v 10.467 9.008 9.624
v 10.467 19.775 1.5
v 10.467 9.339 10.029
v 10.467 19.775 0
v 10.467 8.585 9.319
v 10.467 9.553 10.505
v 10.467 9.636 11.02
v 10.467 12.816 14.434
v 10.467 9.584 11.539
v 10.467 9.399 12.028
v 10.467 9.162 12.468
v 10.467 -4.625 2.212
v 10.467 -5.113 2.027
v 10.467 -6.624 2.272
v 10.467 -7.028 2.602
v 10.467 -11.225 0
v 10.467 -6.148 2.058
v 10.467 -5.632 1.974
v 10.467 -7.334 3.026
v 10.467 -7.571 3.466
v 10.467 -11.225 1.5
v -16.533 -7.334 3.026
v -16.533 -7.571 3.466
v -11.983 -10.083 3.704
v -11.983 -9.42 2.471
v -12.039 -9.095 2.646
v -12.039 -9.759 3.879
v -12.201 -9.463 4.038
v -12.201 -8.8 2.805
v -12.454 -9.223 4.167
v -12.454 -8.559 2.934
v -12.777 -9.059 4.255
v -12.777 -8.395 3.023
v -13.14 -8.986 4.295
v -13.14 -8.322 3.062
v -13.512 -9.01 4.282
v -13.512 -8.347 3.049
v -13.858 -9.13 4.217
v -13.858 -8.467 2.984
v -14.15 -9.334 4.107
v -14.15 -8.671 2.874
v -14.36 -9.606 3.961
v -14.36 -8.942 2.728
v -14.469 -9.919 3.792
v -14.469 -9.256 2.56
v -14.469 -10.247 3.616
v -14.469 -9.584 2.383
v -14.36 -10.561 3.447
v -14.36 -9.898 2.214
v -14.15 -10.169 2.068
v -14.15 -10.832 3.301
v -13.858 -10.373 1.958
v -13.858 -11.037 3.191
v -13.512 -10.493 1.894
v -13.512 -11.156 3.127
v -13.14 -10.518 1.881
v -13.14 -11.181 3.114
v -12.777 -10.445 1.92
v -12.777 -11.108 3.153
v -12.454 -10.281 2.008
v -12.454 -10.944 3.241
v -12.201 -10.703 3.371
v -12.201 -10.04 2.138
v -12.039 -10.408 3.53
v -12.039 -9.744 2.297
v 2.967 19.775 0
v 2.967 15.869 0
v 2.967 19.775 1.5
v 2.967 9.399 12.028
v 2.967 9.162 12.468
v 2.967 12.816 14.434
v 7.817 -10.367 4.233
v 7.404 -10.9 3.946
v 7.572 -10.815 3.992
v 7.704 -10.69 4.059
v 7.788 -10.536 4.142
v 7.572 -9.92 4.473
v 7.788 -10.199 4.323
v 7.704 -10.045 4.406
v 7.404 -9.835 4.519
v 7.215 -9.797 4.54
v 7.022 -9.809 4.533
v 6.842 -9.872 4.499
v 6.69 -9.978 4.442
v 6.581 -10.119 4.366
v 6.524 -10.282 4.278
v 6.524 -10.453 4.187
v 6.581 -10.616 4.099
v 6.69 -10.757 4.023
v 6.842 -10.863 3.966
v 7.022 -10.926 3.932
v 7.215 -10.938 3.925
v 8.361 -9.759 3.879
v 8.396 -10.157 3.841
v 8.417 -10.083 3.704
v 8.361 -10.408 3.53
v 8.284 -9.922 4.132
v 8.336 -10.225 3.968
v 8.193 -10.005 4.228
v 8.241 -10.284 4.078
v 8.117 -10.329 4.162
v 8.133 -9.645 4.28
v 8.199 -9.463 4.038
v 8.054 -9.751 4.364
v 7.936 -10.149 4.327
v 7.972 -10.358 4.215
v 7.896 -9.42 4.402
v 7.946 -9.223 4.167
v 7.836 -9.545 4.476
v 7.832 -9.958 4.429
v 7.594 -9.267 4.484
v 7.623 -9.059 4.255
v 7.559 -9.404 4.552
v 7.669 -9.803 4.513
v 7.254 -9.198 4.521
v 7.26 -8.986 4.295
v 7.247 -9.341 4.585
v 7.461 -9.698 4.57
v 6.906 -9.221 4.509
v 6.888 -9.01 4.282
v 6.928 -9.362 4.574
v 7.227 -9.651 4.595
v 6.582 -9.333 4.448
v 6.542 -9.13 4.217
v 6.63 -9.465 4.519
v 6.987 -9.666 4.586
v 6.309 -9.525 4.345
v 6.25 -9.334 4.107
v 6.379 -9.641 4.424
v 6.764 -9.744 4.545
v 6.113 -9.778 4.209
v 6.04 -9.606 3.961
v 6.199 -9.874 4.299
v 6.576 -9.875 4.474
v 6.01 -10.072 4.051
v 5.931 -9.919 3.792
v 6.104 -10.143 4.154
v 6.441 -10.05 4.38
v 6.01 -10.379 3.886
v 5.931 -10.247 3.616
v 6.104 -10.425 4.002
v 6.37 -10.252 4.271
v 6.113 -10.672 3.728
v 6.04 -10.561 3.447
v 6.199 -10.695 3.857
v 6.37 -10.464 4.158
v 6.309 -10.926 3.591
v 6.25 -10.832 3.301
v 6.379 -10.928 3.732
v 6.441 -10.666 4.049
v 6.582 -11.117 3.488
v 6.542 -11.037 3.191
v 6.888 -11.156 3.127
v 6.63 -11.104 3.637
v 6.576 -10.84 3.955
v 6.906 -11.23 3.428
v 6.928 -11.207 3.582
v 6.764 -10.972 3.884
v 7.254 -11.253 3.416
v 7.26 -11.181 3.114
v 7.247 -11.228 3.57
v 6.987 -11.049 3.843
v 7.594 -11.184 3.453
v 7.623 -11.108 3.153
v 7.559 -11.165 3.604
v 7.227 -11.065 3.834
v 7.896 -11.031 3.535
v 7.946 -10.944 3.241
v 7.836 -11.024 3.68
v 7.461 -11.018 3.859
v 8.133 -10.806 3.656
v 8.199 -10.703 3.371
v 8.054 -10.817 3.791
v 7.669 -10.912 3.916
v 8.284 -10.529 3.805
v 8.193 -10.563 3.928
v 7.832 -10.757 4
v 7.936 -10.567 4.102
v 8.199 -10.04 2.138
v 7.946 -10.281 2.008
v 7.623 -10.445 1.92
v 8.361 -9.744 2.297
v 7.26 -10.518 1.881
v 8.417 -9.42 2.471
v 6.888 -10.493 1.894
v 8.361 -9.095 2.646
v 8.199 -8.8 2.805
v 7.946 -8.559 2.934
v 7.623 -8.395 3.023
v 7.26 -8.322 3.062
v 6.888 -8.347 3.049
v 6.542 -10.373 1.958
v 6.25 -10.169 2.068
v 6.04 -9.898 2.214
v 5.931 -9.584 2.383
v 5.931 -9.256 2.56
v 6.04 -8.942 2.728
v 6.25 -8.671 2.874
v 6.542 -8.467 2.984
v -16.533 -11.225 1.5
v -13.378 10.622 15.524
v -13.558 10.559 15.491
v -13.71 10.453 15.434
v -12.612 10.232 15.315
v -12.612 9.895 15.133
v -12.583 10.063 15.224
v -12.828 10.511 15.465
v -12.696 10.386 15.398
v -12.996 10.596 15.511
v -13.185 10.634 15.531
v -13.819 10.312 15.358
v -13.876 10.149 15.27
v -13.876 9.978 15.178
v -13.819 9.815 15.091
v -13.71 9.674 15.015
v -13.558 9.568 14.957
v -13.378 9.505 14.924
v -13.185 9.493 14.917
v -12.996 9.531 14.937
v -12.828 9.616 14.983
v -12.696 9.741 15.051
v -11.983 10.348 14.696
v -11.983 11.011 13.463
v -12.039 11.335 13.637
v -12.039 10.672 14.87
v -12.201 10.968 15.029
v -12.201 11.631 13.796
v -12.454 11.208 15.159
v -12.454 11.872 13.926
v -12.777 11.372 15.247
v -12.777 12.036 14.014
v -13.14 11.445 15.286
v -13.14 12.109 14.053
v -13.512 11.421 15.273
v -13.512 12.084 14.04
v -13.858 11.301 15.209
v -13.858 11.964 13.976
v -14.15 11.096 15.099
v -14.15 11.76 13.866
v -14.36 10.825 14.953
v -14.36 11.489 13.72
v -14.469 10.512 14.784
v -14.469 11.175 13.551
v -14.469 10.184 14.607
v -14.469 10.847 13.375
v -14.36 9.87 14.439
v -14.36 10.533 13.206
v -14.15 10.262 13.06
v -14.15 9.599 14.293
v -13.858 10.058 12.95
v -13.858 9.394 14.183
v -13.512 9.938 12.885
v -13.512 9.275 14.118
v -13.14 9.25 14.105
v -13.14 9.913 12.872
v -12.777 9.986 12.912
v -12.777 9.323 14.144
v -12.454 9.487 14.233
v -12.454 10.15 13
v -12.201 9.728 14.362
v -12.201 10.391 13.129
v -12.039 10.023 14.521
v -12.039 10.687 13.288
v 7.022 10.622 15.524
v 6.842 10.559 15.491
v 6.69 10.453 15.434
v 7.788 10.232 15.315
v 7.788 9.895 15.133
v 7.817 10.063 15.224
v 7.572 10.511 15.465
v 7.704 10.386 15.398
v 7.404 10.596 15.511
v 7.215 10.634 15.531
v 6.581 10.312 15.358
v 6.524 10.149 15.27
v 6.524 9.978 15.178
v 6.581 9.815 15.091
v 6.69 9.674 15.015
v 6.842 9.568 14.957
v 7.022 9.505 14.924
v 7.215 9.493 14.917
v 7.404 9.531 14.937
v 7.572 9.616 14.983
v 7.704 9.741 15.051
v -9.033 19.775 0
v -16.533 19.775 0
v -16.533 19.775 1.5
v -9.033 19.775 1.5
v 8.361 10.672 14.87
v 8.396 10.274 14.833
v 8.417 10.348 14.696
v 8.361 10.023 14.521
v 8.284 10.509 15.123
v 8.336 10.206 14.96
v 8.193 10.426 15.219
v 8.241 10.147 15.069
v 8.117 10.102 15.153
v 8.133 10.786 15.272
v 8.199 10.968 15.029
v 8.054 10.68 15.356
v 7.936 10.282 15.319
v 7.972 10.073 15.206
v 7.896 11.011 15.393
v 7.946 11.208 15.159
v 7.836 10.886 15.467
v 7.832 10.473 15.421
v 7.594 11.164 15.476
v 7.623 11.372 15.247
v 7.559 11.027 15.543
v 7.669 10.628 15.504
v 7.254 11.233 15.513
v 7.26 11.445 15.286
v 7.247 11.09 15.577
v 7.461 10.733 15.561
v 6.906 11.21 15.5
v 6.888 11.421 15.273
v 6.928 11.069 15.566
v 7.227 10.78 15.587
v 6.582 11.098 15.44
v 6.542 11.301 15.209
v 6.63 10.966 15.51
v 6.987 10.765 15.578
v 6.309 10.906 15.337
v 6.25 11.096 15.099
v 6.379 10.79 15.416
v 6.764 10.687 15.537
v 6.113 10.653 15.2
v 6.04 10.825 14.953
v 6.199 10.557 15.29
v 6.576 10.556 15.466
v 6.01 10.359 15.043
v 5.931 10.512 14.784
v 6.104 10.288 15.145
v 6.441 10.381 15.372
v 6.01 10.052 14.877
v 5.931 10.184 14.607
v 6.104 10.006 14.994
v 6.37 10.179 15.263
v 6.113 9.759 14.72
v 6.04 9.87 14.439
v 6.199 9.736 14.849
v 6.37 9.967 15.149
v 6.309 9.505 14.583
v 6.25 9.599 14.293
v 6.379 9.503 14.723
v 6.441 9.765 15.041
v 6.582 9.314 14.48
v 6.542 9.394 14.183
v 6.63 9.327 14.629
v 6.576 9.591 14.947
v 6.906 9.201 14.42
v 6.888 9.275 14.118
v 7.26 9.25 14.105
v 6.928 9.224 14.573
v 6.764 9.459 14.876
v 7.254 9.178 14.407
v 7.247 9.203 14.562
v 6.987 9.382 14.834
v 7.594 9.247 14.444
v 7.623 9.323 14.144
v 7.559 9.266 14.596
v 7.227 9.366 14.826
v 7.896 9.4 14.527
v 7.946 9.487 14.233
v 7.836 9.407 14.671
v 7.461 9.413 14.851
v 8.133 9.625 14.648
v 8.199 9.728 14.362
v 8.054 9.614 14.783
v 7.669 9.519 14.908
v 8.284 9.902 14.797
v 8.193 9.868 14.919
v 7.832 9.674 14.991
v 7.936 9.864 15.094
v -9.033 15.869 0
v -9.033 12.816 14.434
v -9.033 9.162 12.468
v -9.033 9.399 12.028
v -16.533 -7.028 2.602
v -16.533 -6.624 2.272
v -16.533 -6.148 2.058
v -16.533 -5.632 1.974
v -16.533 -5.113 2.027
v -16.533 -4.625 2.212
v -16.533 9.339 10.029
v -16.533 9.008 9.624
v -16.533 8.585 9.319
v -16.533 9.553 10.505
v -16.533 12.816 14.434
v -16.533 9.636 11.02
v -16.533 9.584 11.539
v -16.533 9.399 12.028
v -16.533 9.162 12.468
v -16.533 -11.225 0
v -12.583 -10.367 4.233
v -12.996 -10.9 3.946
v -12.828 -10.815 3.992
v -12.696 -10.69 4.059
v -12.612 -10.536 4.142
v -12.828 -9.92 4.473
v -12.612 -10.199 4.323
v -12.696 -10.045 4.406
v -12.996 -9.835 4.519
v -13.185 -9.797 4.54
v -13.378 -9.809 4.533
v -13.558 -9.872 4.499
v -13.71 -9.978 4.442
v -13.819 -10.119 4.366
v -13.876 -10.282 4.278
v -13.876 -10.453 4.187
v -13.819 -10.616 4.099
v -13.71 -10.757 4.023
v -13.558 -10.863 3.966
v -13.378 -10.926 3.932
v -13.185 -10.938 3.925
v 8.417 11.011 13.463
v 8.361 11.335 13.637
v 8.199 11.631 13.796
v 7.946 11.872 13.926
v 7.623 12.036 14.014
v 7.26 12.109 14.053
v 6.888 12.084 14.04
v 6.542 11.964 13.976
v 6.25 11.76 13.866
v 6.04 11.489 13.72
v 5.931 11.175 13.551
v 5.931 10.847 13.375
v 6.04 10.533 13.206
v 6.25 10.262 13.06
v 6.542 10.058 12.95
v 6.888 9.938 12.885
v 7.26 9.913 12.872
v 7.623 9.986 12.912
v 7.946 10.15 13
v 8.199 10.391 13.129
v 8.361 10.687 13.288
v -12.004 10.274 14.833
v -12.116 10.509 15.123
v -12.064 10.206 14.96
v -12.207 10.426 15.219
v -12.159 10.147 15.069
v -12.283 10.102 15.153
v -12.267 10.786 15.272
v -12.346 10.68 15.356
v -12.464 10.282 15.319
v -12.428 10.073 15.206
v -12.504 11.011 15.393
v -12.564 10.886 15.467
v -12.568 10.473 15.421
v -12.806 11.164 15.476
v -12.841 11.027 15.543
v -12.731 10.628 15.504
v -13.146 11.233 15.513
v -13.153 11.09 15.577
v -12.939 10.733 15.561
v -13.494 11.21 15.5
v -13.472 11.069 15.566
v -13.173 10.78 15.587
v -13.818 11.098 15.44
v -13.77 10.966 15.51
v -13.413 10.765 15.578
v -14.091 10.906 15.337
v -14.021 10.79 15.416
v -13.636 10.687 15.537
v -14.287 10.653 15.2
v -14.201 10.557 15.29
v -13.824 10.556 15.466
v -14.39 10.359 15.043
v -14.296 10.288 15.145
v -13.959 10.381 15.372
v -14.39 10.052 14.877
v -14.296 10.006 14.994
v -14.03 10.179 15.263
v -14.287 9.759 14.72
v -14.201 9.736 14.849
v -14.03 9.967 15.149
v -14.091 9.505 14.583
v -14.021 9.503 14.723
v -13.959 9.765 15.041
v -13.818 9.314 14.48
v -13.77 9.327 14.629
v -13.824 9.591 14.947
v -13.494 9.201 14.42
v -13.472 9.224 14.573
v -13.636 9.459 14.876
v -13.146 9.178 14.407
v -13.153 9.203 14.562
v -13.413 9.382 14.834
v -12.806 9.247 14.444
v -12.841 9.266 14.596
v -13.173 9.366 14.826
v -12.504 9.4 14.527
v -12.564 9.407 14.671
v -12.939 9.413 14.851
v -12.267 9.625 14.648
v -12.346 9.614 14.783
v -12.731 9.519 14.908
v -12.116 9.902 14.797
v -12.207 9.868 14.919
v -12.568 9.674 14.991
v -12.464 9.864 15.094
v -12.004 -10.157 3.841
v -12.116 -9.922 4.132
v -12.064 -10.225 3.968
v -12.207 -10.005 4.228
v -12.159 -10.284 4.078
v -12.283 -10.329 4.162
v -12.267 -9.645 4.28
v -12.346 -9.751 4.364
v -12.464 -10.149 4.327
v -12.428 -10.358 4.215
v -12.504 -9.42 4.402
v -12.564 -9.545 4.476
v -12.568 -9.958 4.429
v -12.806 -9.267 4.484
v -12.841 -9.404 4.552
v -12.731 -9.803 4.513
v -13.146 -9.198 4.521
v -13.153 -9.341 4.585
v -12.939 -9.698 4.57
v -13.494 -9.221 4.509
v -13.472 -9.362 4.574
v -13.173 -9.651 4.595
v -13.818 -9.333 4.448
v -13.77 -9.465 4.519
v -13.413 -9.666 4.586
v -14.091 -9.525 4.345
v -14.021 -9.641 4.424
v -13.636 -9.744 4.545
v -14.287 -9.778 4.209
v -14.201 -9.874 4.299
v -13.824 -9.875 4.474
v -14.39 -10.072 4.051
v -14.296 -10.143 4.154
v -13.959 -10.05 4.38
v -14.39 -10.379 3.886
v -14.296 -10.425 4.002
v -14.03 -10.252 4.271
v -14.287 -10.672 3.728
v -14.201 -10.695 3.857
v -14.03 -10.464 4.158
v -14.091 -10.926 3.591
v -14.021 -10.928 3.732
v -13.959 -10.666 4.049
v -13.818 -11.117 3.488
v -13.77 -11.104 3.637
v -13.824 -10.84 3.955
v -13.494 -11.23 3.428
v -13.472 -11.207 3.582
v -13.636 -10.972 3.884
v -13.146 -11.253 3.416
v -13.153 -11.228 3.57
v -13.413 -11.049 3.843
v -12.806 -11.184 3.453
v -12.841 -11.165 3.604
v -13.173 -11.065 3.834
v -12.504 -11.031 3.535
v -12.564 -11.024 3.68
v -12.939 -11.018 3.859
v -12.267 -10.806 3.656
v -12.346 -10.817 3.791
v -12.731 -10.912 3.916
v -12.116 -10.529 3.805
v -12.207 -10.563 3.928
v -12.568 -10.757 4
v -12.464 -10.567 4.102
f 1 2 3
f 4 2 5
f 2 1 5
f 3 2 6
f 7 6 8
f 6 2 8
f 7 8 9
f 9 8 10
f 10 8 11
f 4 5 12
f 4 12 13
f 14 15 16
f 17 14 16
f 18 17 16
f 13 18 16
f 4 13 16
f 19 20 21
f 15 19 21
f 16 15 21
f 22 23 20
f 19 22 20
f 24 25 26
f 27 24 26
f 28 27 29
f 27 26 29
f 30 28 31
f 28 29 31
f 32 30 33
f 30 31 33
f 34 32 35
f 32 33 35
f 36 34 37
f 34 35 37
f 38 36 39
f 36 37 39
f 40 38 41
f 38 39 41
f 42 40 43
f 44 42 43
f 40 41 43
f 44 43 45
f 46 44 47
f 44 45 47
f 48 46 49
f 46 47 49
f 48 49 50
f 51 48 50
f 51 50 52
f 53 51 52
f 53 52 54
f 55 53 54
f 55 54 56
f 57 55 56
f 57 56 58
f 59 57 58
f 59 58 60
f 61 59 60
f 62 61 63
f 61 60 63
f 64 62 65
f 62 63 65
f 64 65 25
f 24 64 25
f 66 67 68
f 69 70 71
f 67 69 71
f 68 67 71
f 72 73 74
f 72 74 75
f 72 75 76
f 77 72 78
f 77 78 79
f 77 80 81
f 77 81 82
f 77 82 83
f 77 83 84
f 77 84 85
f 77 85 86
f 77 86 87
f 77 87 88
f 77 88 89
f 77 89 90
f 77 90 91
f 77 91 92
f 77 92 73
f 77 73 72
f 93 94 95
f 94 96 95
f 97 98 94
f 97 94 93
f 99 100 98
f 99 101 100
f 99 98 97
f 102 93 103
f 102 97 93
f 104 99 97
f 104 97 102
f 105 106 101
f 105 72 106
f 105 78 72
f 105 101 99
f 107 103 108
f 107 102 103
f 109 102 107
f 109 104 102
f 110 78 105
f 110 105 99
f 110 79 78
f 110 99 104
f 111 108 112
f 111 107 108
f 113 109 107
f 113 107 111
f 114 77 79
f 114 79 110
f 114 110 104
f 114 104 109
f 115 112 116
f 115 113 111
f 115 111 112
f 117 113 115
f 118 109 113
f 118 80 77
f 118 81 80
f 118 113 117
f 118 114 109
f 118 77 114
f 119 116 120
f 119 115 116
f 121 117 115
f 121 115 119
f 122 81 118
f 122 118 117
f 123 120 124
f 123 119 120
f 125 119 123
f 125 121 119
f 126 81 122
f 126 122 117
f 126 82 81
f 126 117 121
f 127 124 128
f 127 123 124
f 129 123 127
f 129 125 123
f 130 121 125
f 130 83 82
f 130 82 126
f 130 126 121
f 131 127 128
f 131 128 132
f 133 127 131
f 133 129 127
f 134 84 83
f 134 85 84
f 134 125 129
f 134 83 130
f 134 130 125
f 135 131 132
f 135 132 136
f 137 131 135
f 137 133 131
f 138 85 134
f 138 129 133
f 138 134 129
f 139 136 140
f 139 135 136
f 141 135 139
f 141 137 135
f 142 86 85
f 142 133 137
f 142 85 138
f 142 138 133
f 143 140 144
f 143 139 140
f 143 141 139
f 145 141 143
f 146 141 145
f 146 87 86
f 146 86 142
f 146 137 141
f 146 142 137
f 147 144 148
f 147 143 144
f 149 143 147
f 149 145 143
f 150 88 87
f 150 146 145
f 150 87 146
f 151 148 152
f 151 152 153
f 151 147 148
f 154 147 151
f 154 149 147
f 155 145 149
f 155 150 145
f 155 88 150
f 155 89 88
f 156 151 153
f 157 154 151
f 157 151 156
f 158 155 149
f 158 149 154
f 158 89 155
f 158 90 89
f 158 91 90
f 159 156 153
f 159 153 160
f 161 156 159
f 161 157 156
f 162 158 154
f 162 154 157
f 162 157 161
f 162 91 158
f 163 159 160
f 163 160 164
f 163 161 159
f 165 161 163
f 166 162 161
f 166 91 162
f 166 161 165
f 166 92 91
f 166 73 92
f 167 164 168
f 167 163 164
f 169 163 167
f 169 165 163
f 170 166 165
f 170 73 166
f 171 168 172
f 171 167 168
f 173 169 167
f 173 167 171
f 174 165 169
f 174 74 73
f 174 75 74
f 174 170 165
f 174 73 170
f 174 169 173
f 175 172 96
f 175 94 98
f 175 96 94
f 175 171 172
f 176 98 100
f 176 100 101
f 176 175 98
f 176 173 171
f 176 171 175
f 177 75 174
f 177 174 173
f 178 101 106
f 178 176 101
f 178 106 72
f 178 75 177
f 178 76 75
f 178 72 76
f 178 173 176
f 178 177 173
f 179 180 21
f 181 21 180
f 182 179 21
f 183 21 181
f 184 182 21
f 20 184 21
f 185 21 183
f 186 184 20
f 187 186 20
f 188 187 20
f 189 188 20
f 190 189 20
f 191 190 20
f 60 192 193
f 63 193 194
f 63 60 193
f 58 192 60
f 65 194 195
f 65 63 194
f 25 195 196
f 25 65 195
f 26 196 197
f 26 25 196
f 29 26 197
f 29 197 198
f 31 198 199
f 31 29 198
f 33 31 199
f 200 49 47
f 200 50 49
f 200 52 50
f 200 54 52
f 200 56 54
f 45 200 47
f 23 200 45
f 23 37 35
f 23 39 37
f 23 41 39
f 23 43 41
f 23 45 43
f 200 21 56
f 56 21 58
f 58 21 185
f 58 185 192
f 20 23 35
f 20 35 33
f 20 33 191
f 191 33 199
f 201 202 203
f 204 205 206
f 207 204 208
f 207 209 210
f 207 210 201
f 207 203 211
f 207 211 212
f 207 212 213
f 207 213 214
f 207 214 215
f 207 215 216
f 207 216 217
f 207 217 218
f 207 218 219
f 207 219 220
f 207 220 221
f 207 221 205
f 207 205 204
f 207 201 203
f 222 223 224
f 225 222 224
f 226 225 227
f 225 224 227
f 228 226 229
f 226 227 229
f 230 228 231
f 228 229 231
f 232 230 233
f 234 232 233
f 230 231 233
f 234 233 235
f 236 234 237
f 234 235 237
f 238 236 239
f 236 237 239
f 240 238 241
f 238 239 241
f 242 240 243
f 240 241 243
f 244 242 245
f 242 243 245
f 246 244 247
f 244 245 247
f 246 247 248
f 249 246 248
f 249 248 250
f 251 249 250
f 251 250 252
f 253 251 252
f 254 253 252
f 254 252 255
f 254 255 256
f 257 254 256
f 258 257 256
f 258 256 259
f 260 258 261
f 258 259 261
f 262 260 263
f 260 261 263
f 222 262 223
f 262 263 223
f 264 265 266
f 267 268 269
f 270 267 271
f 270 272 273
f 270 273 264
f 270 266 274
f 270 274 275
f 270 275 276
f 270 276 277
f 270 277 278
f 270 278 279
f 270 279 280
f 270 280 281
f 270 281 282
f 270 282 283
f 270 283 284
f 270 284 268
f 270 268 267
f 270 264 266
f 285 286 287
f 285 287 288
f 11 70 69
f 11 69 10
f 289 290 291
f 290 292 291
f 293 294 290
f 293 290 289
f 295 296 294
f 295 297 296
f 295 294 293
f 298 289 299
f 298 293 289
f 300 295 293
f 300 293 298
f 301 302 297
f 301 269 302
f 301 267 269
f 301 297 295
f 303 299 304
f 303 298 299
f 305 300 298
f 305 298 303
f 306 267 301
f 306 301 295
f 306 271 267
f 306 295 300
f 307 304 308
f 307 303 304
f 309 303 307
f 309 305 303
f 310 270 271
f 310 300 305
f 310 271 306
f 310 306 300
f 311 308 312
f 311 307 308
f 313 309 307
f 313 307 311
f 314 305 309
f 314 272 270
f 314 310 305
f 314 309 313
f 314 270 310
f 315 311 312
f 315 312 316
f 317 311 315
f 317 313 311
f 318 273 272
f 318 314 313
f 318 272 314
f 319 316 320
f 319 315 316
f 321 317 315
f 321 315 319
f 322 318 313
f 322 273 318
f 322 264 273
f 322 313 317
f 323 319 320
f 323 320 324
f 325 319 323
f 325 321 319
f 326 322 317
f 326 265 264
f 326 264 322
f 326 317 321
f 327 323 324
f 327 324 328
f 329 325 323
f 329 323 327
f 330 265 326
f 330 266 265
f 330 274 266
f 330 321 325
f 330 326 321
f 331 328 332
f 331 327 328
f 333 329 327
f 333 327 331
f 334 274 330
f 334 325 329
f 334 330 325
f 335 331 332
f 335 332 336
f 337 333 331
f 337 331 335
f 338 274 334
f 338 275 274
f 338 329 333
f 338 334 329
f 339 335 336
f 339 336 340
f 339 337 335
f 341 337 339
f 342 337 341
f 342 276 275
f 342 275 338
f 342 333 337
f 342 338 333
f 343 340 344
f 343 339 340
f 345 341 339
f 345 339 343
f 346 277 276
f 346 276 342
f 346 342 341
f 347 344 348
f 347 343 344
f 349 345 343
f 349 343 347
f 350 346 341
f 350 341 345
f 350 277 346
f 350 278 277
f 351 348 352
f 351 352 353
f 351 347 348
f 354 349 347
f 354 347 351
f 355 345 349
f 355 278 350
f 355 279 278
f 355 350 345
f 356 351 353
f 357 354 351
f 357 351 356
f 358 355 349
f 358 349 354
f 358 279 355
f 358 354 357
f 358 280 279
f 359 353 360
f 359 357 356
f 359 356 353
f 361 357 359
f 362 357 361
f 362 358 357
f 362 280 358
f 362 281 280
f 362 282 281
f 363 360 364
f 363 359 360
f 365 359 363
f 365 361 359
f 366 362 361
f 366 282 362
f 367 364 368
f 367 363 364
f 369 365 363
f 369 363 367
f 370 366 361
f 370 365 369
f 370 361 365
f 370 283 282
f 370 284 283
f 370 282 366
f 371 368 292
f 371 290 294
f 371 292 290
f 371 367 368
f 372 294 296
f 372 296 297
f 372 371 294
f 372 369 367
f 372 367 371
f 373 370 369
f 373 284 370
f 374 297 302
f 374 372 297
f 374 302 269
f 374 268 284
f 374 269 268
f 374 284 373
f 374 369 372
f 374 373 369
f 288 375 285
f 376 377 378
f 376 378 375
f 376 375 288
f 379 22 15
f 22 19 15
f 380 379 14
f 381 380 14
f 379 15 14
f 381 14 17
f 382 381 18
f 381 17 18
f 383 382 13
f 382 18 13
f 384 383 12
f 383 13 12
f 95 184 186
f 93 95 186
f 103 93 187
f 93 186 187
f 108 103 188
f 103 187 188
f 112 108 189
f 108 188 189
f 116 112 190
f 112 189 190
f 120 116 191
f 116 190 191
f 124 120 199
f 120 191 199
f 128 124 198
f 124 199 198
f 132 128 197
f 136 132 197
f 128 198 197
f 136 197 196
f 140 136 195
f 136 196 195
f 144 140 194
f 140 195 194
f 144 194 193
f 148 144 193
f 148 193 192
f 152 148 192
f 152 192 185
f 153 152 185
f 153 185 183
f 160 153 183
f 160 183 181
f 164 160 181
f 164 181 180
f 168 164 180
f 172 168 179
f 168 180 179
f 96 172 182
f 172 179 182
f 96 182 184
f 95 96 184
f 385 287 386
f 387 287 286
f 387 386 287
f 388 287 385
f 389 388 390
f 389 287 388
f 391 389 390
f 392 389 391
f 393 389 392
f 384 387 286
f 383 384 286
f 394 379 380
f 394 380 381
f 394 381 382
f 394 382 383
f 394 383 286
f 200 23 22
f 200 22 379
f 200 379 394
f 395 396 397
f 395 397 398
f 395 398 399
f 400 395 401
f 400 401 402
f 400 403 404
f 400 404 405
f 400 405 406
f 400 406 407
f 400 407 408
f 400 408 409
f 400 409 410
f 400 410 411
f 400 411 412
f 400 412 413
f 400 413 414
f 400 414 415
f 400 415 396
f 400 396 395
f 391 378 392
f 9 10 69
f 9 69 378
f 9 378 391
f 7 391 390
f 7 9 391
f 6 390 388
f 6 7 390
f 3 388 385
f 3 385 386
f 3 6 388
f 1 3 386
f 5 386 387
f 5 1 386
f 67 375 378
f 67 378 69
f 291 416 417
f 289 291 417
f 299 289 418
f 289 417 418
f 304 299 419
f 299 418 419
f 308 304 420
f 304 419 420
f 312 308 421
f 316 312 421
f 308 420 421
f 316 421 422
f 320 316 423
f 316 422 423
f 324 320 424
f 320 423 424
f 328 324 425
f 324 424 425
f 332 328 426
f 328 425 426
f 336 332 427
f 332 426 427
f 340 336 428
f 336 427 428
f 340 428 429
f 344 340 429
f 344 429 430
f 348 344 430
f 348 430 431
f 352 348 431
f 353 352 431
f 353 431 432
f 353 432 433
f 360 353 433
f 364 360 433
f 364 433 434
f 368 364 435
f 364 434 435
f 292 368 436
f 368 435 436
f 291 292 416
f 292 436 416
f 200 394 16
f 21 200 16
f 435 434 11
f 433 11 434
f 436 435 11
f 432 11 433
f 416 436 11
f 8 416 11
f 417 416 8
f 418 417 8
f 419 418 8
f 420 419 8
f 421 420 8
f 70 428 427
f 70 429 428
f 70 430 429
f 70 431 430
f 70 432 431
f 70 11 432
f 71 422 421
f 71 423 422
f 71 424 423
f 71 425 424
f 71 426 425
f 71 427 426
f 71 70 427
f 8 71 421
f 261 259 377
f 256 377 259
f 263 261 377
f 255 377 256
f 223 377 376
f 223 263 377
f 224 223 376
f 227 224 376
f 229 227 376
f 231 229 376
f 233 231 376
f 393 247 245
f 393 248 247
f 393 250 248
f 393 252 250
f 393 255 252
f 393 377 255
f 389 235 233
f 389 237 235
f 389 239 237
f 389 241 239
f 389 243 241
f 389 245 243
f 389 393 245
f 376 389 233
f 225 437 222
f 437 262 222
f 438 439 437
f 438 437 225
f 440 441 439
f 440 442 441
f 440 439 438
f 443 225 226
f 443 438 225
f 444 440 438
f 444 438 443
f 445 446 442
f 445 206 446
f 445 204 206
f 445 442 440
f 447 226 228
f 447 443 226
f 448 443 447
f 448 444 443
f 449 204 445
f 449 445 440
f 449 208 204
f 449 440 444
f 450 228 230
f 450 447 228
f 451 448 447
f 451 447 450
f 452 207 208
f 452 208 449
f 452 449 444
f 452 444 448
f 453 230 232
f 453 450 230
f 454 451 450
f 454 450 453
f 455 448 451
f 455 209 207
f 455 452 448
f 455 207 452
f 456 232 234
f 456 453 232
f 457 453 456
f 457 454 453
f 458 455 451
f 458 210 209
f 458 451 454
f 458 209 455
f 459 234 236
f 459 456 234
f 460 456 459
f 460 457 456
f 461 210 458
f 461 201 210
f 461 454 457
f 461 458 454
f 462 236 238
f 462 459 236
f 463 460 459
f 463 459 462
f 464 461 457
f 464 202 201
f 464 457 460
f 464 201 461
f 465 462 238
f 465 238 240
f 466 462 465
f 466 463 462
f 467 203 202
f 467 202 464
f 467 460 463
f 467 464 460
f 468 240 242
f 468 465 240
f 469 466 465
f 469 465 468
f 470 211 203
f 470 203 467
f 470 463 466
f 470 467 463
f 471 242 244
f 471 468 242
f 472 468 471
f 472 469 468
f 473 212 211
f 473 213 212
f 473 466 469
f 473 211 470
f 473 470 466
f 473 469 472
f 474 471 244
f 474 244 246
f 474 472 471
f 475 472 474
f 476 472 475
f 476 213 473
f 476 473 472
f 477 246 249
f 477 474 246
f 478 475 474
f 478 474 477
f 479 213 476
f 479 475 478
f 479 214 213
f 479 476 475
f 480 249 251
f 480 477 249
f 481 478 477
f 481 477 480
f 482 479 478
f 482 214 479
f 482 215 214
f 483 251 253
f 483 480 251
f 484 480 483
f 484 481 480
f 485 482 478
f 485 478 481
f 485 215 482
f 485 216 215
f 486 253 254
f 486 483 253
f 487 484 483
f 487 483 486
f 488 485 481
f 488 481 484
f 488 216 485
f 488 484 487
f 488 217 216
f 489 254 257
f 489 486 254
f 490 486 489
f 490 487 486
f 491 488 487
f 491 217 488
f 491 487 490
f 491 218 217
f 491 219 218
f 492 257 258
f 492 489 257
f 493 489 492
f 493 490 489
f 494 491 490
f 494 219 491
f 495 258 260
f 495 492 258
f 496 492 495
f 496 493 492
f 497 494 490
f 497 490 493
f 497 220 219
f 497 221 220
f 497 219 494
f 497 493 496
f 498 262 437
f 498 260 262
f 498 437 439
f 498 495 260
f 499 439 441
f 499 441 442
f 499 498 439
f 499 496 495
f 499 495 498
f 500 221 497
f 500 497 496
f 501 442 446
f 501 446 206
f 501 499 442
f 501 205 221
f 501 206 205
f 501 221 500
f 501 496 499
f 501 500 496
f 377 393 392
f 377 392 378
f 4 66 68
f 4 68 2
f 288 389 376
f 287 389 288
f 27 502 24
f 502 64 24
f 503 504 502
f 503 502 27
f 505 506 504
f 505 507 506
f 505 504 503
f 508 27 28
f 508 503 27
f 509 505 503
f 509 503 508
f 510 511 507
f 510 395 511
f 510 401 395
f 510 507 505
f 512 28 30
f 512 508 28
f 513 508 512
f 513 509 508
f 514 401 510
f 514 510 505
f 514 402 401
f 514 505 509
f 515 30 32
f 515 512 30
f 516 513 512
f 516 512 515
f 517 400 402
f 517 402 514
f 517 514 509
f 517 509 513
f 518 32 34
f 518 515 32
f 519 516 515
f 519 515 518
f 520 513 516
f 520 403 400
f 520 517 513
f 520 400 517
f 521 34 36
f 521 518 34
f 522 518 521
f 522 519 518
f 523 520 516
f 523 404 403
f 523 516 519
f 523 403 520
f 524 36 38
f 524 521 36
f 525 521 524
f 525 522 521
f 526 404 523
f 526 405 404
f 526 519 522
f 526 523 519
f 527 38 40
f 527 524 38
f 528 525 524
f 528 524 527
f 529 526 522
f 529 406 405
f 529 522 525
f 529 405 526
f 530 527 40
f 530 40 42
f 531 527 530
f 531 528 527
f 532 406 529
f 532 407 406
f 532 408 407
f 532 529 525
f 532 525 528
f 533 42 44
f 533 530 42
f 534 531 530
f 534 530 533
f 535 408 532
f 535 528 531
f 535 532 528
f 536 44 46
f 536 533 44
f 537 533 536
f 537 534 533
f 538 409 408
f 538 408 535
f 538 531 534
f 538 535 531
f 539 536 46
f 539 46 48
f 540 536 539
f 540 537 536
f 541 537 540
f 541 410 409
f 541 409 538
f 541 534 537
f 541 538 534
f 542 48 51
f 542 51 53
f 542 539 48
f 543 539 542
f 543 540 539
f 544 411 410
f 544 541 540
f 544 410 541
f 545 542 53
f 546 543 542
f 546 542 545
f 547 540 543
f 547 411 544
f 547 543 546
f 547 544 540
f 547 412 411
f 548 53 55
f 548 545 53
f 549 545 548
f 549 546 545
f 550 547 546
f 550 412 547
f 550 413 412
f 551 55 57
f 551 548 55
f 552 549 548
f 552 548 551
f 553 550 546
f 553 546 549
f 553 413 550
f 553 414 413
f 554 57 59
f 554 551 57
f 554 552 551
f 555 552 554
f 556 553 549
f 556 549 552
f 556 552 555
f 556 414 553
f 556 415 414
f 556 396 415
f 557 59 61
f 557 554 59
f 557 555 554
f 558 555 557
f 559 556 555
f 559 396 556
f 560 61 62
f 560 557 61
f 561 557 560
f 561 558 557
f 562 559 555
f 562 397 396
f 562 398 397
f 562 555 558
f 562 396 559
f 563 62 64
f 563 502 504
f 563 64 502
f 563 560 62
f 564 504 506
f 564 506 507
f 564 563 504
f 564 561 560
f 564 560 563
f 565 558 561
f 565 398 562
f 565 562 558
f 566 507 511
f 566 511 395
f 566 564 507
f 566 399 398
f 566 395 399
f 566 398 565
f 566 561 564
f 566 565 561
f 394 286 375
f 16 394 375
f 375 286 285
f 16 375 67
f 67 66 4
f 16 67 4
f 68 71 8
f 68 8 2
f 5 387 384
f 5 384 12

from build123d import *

# Parameters (mm, degrees)
F0_W      = 27
F0_H      = 31
F1_DEPTH  = 1.5
F3_DEPTH  = 27
F4_W      = 27
F4_H      = 19
F5_DEPTH  = 2.5
F6_R      = 2
F7_W      = 12
F7_H      = 4.15
F8_DEPTH  = 25
F9_R      = 1.25
F10_DEPTH = 2
F11_R     = 0.6


with BuildPart() as f1:
    # F0 (on Top) → F1 (new body)
    with BuildSketch(Plane.XY):
        with Locations((-3.0333630769, 4.2747315317)):
            Rectangle(F0_W, F0_H)
    extrude(amount=F1_DEPTH)

    # F2 (on face) → F3 (join)
    with BuildSketch(Plane(origin=(-16.5333630769, 0, 0), x_dir=(0, -1, 0), z_dir=(-1, 0, 0))):
        Polygon((-19.7747315317, 1.5), (11.2252684683, 1.5), (-12.816344435, 14.434096374), align=None)
    extrude(amount=-F3_DEPTH)

    # F4 (on face) → F5 (cut)
    with BuildSketch(Plane(origin=(0, -3.1455131558, 5.846810437), x_dir=(1, 0, 0), z_dir=(0, -0.473776424, 0.8806451613))):
        with Locations((-3.0333630769, 4.4751862752)):
            Rectangle(F4_W, F4_H)
    extrude(amount=-F5_DEPTH, mode=Mode.SUBTRACT)

    # F6
    f6_edges = [f1.edges().sort_by_distance(p)[0] for p in [
        (-3.033363, 10.346108, 10.266311),
        (-3.033363, -6.38615, 1.264559),
    ]]
    fillet(f6_edges, radius=F6_R)

    # F7 (on face) → F8 (cut)
    with BuildSketch(Plane(origin=(0, -3.1455131558, 5.846810437), x_dir=(1, 0, 0), z_dir=(0, -0.473776424, 0.8806451613))):
        with Locations((-3.0333630769, 16.0501862752)):
            Rectangle(F7_W, F7_H)
    extrude(amount=-F8_DEPTH, mode=Mode.SUBTRACT)

    # F9 (on face) → F10 (join)
    with BuildSketch(Plane(origin=(0, -3.1455131558, 5.846810437), x_dir=(1, 0, 0), z_dir=(0, -0.473776424, 0.8806451613))):
        with Locations((-13.2333630769, 16.0751862752)):
            Circle(F9_R)
        with Locations((7.1666369231, 16.0751862752)):
            Circle(F9_R)
        with Locations((-13.2333630769, -7.1248137248)):
            Circle(F9_R)
        with Locations((7.1666369231, -7.1248137248)):
            Circle(F9_R)
    extrude(amount=F10_DEPTH)

    # F11
    f11_edges = [f1.edges().sort_by_distance(p)[0] for p in [
        (-14.483363, -10.367499, 4.232532),
        (5.916637, -10.367499, 4.232532),
        (-14.483363, 10.063469, 15.224145),
        (5.916637, 10.063469, 15.224145),
    ]]
    fillet(f11_edges, radius=F11_R)


solid = f1.part
